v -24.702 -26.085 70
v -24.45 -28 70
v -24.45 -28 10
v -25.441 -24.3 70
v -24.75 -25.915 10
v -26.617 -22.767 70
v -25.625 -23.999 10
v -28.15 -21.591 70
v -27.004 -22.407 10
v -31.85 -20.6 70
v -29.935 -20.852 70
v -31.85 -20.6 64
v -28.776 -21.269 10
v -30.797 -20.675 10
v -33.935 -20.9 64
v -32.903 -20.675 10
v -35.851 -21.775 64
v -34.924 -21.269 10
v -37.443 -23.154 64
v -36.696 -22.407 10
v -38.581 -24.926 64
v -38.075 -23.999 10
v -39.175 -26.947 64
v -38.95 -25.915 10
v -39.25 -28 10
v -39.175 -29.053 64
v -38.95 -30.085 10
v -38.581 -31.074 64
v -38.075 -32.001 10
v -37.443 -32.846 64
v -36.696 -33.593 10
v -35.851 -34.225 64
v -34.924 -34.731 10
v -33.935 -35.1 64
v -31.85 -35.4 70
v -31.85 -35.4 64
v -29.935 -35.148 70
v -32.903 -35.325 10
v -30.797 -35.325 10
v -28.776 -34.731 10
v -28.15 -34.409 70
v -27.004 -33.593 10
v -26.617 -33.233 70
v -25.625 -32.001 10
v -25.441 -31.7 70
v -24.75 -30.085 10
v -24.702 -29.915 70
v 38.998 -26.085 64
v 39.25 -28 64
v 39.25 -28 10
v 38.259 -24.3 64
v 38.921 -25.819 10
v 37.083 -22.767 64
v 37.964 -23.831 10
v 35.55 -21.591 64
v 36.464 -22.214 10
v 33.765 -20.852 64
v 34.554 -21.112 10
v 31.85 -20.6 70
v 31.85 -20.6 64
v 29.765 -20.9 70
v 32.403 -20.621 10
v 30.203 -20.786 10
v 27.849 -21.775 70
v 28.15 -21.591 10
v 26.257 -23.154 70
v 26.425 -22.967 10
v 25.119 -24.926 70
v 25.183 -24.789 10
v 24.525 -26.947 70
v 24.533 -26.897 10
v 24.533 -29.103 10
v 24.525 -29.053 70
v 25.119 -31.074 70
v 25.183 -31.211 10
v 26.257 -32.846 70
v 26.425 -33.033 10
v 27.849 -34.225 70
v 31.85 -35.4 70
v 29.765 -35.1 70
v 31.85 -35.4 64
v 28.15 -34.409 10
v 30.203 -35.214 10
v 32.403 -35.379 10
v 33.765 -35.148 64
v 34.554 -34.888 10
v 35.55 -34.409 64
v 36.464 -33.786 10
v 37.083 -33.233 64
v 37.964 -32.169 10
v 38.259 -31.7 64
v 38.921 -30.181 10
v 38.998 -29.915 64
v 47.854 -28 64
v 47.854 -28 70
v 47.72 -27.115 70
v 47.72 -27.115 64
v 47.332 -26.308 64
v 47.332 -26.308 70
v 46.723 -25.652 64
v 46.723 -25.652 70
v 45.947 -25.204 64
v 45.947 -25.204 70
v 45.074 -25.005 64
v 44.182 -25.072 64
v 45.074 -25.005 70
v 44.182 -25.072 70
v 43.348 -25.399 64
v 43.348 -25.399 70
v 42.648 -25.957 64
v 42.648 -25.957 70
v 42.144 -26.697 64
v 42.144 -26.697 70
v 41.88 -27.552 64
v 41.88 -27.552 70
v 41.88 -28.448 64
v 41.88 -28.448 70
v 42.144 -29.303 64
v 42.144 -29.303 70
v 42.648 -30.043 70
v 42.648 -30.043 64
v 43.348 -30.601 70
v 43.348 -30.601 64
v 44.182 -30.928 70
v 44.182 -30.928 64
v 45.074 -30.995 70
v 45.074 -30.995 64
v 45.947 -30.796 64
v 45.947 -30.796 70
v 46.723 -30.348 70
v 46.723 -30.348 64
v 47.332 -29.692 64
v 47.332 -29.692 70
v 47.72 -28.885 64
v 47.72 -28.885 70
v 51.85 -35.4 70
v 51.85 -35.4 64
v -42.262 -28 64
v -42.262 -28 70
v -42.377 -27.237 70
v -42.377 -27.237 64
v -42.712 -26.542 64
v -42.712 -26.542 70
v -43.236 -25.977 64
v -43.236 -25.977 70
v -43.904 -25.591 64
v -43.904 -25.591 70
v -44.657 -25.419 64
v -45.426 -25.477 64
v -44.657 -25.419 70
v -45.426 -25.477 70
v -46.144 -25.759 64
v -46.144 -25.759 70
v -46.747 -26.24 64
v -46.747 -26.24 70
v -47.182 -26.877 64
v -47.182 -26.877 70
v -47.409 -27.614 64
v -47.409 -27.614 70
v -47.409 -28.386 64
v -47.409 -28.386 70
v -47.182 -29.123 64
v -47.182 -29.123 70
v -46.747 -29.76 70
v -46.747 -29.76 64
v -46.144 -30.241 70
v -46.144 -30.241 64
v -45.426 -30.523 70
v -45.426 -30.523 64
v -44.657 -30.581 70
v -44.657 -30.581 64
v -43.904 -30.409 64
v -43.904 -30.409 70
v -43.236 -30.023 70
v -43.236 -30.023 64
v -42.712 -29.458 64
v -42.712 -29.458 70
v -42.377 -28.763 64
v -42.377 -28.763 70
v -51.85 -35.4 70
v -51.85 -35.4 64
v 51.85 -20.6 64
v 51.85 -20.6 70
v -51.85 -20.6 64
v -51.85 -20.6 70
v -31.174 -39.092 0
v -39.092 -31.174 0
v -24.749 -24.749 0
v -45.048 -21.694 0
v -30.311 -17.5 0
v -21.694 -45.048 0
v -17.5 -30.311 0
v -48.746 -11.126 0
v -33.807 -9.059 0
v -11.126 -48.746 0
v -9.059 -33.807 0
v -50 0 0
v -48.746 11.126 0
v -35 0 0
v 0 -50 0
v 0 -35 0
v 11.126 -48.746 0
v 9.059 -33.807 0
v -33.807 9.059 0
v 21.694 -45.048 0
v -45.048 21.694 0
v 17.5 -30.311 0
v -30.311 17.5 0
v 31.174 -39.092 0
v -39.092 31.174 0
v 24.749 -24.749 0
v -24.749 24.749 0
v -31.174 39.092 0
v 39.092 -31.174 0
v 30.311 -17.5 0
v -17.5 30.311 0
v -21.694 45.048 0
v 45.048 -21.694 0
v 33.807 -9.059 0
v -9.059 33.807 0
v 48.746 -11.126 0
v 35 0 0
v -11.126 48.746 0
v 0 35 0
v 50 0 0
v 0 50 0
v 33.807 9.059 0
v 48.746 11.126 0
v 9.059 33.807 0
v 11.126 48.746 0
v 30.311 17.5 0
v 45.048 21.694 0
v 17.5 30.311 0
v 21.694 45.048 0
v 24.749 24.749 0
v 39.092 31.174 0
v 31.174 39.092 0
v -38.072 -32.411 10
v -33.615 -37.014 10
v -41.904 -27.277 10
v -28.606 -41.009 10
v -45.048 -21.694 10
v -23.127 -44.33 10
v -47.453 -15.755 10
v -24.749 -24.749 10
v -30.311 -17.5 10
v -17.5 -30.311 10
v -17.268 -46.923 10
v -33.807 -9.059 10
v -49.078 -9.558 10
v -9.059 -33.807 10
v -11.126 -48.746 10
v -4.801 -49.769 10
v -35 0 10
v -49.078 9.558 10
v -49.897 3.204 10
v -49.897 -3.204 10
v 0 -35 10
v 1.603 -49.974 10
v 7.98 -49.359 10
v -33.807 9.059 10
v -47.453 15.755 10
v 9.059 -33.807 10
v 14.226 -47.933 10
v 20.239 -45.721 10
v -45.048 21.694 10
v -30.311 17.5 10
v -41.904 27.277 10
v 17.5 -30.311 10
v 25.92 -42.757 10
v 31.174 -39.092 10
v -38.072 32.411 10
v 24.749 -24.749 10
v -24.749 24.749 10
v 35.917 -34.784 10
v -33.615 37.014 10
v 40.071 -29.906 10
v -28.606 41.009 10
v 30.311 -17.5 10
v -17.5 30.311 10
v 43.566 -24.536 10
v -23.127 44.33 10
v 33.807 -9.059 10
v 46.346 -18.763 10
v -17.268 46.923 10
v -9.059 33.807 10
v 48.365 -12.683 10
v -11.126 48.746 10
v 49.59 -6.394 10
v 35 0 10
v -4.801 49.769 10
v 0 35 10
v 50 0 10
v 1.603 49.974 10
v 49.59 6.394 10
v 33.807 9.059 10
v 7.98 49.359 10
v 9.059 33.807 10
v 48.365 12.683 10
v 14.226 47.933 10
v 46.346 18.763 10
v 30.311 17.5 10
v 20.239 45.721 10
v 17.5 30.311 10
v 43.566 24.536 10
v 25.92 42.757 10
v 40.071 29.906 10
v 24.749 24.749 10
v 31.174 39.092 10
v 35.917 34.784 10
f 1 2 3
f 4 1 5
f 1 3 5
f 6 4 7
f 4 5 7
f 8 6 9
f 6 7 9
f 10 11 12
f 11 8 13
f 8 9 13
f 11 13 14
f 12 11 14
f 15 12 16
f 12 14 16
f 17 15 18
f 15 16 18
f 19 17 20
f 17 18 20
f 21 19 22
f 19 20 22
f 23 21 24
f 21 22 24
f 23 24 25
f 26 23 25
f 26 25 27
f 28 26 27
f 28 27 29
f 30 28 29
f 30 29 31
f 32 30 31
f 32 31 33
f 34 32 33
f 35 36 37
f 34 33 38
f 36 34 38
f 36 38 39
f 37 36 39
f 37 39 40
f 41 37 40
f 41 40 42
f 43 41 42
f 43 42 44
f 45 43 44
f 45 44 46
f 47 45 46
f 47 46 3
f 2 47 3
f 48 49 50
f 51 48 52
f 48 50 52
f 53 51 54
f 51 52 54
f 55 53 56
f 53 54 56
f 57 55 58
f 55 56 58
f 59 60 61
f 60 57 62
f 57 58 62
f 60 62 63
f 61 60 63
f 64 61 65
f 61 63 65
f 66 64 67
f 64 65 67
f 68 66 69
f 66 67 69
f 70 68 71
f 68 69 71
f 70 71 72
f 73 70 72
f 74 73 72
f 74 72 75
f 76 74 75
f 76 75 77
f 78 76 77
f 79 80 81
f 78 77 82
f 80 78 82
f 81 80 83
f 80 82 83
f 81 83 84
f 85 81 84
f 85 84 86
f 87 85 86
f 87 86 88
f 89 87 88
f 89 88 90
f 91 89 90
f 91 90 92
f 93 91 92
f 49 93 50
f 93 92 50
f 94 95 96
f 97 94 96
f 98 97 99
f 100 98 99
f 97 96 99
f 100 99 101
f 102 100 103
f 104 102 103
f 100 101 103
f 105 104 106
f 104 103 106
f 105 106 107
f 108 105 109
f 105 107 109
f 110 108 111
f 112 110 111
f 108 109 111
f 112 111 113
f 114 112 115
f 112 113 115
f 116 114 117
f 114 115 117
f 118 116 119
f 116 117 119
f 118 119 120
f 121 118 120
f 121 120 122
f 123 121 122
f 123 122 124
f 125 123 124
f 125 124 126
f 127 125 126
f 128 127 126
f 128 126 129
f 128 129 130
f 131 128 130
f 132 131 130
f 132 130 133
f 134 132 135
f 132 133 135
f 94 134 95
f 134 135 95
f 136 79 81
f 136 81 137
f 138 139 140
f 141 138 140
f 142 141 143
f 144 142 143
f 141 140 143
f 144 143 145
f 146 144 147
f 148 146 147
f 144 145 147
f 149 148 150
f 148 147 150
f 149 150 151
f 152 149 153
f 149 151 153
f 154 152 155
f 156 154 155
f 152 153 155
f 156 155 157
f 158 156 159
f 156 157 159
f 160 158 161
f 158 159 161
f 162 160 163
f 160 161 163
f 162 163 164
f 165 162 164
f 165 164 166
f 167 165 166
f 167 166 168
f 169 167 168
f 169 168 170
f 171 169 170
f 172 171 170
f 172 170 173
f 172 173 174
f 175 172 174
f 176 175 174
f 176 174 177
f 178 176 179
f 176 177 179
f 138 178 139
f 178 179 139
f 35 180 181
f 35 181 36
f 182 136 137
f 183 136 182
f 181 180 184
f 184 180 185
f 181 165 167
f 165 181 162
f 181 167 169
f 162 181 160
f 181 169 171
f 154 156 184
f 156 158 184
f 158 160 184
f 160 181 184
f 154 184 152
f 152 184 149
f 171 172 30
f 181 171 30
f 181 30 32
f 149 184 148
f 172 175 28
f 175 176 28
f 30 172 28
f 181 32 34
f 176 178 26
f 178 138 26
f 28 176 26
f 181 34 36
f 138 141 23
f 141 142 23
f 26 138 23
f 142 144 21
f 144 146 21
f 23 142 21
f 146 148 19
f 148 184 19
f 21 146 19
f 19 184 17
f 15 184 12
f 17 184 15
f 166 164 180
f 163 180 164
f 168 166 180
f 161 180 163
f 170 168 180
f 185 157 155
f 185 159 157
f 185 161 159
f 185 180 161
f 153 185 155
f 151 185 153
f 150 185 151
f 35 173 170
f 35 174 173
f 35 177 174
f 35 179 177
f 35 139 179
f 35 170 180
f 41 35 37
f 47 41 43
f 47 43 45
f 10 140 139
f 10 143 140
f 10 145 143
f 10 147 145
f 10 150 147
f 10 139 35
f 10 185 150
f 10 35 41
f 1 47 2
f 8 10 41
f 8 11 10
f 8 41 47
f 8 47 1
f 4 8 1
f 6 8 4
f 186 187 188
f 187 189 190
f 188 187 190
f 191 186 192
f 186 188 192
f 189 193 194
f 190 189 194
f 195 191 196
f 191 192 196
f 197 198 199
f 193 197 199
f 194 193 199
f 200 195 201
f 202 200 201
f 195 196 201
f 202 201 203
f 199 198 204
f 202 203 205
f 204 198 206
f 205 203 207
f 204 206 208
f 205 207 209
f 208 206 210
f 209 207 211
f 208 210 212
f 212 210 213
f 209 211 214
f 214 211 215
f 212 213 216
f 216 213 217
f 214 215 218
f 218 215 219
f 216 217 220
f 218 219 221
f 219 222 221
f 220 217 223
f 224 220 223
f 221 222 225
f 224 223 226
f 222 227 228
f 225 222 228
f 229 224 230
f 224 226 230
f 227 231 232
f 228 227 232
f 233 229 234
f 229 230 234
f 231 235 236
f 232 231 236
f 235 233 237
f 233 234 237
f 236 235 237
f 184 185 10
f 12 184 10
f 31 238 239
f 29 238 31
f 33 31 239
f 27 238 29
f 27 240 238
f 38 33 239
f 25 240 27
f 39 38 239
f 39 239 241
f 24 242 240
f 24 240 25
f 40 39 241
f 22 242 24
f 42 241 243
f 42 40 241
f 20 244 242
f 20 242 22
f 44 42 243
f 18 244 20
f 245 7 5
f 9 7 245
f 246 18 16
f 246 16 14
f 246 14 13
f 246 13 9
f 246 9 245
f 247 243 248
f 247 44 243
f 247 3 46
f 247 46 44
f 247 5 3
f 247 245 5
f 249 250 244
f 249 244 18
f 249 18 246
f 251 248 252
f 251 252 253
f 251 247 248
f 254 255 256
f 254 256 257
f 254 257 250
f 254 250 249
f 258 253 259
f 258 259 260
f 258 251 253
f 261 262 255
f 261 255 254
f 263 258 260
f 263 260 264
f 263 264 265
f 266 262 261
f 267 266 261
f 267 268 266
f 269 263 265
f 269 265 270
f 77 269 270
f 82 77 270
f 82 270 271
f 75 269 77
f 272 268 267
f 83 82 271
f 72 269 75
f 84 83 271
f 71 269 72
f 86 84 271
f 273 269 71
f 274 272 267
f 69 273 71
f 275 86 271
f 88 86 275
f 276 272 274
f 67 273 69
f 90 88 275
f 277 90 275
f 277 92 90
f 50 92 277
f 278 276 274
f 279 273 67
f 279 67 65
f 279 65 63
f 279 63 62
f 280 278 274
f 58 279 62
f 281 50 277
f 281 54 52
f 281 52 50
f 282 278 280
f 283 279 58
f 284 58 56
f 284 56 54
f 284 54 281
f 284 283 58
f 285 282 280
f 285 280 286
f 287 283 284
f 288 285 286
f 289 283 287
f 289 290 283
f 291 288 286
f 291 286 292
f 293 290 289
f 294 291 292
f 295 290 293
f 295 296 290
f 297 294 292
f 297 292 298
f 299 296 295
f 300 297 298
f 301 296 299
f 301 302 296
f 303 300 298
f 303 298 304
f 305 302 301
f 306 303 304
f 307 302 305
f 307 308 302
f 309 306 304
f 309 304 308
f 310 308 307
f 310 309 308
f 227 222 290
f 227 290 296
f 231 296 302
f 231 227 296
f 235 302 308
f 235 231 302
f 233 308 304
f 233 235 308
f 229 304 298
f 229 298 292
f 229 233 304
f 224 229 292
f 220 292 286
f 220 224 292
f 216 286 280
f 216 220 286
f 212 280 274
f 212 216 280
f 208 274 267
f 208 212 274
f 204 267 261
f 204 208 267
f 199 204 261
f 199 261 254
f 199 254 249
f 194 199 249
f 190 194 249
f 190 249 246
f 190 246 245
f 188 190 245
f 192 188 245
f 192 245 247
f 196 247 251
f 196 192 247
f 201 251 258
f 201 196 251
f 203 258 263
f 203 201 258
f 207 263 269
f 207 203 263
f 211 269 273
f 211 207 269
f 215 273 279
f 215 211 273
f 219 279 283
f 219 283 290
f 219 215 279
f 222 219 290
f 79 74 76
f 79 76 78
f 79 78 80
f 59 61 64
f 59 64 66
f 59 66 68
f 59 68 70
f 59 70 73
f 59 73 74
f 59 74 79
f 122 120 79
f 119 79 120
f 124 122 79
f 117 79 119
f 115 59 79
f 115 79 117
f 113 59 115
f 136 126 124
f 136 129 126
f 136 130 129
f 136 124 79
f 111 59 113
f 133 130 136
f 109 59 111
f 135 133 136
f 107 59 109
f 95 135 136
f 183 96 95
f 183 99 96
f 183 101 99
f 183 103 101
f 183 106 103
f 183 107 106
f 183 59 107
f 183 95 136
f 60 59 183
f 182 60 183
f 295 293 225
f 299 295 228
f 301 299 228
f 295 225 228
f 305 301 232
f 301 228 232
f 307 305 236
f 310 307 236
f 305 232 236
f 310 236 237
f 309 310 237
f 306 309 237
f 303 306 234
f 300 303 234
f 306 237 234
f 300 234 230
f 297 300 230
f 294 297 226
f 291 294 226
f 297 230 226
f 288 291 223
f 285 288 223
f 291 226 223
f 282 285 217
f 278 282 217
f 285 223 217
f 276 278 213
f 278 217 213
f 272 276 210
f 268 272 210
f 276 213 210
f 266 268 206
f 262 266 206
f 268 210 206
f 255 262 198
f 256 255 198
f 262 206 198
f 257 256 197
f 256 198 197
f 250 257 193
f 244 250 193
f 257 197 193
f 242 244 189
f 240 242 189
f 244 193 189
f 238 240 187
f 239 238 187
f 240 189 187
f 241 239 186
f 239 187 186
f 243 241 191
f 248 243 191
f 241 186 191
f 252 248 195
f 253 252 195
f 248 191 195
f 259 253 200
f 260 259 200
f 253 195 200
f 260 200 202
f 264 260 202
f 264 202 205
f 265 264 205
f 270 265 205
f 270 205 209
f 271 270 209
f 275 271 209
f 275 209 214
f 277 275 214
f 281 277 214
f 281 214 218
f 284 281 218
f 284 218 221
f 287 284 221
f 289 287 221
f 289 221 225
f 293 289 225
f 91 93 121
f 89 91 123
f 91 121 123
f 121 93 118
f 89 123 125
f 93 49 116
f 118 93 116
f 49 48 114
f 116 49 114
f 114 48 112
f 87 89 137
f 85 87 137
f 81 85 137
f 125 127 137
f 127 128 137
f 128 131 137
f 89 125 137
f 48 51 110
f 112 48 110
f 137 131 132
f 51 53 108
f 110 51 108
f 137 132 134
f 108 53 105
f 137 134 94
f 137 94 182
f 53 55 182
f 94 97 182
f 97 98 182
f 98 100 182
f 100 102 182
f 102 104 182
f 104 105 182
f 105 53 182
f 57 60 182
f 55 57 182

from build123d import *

# Parameters (mm, degrees)
ESQUISSE1_R        = 50
ESQUISSE1_R_2      = 35
BOSS_EXTRU_2_DEPTH = 10
ESQUISSE4_R        = 7.4
BOSS_EXTRU_3_DEPTH = 70
ESQUISSE5_W        = 20
ESQUISSE5_H        = 14.8
ESQUISSE5_R        = 2.588125741
ESQUISSE5_R_2      = 3.00370922
BOSS_EXTRU_4_DEPTH = 6


with BuildPart() as part:
    # Esquisse1 → Boss.-Extru.2 (new body)
    with BuildSketch(Plane.XY):
        Circle(ESQUISSE1_R)
        Circle(ESQUISSE1_R_2, mode=Mode.SUBTRACT)
    extrude(amount=BOSS_EXTRU_2_DEPTH)

    # Esquisse4 → Boss.-Extru.3 (add)
    with BuildSketch(Plane.XY):
        with Locations((-31.85, -28)):
            Circle(ESQUISSE4_R)
        with Locations((31.85, -28)):
            Circle(ESQUISSE4_R)
    extrude(amount=BOSS_EXTRU_3_DEPTH)

    # Esquisse5 → Boss.-Extru.4 (add)
    # profile 1 of 2: a face of its own
    with BuildSketch(Plane.XY.offset(70)):
        with Locations((-41.85, -28)):
            Rectangle(ESQUISSE5_W, ESQUISSE5_H)
        with Locations((-44.85, -28)):
            Circle(ESQUISSE5_R, mode=Mode.SUBTRACT)
    # profile 2 of 2: a face of its own
    with BuildSketch(Plane.XY.offset(70)):
        with Locations((41.85, -28)):
            Rectangle(ESQUISSE5_W, ESQUISSE5_H)
        with Locations((44.85, -28)):
            Circle(ESQUISSE5_R_2, mode=Mode.SUBTRACT)
    extrude(amount=-BOSS_EXTRU_4_DEPTH)


solid = part.part
